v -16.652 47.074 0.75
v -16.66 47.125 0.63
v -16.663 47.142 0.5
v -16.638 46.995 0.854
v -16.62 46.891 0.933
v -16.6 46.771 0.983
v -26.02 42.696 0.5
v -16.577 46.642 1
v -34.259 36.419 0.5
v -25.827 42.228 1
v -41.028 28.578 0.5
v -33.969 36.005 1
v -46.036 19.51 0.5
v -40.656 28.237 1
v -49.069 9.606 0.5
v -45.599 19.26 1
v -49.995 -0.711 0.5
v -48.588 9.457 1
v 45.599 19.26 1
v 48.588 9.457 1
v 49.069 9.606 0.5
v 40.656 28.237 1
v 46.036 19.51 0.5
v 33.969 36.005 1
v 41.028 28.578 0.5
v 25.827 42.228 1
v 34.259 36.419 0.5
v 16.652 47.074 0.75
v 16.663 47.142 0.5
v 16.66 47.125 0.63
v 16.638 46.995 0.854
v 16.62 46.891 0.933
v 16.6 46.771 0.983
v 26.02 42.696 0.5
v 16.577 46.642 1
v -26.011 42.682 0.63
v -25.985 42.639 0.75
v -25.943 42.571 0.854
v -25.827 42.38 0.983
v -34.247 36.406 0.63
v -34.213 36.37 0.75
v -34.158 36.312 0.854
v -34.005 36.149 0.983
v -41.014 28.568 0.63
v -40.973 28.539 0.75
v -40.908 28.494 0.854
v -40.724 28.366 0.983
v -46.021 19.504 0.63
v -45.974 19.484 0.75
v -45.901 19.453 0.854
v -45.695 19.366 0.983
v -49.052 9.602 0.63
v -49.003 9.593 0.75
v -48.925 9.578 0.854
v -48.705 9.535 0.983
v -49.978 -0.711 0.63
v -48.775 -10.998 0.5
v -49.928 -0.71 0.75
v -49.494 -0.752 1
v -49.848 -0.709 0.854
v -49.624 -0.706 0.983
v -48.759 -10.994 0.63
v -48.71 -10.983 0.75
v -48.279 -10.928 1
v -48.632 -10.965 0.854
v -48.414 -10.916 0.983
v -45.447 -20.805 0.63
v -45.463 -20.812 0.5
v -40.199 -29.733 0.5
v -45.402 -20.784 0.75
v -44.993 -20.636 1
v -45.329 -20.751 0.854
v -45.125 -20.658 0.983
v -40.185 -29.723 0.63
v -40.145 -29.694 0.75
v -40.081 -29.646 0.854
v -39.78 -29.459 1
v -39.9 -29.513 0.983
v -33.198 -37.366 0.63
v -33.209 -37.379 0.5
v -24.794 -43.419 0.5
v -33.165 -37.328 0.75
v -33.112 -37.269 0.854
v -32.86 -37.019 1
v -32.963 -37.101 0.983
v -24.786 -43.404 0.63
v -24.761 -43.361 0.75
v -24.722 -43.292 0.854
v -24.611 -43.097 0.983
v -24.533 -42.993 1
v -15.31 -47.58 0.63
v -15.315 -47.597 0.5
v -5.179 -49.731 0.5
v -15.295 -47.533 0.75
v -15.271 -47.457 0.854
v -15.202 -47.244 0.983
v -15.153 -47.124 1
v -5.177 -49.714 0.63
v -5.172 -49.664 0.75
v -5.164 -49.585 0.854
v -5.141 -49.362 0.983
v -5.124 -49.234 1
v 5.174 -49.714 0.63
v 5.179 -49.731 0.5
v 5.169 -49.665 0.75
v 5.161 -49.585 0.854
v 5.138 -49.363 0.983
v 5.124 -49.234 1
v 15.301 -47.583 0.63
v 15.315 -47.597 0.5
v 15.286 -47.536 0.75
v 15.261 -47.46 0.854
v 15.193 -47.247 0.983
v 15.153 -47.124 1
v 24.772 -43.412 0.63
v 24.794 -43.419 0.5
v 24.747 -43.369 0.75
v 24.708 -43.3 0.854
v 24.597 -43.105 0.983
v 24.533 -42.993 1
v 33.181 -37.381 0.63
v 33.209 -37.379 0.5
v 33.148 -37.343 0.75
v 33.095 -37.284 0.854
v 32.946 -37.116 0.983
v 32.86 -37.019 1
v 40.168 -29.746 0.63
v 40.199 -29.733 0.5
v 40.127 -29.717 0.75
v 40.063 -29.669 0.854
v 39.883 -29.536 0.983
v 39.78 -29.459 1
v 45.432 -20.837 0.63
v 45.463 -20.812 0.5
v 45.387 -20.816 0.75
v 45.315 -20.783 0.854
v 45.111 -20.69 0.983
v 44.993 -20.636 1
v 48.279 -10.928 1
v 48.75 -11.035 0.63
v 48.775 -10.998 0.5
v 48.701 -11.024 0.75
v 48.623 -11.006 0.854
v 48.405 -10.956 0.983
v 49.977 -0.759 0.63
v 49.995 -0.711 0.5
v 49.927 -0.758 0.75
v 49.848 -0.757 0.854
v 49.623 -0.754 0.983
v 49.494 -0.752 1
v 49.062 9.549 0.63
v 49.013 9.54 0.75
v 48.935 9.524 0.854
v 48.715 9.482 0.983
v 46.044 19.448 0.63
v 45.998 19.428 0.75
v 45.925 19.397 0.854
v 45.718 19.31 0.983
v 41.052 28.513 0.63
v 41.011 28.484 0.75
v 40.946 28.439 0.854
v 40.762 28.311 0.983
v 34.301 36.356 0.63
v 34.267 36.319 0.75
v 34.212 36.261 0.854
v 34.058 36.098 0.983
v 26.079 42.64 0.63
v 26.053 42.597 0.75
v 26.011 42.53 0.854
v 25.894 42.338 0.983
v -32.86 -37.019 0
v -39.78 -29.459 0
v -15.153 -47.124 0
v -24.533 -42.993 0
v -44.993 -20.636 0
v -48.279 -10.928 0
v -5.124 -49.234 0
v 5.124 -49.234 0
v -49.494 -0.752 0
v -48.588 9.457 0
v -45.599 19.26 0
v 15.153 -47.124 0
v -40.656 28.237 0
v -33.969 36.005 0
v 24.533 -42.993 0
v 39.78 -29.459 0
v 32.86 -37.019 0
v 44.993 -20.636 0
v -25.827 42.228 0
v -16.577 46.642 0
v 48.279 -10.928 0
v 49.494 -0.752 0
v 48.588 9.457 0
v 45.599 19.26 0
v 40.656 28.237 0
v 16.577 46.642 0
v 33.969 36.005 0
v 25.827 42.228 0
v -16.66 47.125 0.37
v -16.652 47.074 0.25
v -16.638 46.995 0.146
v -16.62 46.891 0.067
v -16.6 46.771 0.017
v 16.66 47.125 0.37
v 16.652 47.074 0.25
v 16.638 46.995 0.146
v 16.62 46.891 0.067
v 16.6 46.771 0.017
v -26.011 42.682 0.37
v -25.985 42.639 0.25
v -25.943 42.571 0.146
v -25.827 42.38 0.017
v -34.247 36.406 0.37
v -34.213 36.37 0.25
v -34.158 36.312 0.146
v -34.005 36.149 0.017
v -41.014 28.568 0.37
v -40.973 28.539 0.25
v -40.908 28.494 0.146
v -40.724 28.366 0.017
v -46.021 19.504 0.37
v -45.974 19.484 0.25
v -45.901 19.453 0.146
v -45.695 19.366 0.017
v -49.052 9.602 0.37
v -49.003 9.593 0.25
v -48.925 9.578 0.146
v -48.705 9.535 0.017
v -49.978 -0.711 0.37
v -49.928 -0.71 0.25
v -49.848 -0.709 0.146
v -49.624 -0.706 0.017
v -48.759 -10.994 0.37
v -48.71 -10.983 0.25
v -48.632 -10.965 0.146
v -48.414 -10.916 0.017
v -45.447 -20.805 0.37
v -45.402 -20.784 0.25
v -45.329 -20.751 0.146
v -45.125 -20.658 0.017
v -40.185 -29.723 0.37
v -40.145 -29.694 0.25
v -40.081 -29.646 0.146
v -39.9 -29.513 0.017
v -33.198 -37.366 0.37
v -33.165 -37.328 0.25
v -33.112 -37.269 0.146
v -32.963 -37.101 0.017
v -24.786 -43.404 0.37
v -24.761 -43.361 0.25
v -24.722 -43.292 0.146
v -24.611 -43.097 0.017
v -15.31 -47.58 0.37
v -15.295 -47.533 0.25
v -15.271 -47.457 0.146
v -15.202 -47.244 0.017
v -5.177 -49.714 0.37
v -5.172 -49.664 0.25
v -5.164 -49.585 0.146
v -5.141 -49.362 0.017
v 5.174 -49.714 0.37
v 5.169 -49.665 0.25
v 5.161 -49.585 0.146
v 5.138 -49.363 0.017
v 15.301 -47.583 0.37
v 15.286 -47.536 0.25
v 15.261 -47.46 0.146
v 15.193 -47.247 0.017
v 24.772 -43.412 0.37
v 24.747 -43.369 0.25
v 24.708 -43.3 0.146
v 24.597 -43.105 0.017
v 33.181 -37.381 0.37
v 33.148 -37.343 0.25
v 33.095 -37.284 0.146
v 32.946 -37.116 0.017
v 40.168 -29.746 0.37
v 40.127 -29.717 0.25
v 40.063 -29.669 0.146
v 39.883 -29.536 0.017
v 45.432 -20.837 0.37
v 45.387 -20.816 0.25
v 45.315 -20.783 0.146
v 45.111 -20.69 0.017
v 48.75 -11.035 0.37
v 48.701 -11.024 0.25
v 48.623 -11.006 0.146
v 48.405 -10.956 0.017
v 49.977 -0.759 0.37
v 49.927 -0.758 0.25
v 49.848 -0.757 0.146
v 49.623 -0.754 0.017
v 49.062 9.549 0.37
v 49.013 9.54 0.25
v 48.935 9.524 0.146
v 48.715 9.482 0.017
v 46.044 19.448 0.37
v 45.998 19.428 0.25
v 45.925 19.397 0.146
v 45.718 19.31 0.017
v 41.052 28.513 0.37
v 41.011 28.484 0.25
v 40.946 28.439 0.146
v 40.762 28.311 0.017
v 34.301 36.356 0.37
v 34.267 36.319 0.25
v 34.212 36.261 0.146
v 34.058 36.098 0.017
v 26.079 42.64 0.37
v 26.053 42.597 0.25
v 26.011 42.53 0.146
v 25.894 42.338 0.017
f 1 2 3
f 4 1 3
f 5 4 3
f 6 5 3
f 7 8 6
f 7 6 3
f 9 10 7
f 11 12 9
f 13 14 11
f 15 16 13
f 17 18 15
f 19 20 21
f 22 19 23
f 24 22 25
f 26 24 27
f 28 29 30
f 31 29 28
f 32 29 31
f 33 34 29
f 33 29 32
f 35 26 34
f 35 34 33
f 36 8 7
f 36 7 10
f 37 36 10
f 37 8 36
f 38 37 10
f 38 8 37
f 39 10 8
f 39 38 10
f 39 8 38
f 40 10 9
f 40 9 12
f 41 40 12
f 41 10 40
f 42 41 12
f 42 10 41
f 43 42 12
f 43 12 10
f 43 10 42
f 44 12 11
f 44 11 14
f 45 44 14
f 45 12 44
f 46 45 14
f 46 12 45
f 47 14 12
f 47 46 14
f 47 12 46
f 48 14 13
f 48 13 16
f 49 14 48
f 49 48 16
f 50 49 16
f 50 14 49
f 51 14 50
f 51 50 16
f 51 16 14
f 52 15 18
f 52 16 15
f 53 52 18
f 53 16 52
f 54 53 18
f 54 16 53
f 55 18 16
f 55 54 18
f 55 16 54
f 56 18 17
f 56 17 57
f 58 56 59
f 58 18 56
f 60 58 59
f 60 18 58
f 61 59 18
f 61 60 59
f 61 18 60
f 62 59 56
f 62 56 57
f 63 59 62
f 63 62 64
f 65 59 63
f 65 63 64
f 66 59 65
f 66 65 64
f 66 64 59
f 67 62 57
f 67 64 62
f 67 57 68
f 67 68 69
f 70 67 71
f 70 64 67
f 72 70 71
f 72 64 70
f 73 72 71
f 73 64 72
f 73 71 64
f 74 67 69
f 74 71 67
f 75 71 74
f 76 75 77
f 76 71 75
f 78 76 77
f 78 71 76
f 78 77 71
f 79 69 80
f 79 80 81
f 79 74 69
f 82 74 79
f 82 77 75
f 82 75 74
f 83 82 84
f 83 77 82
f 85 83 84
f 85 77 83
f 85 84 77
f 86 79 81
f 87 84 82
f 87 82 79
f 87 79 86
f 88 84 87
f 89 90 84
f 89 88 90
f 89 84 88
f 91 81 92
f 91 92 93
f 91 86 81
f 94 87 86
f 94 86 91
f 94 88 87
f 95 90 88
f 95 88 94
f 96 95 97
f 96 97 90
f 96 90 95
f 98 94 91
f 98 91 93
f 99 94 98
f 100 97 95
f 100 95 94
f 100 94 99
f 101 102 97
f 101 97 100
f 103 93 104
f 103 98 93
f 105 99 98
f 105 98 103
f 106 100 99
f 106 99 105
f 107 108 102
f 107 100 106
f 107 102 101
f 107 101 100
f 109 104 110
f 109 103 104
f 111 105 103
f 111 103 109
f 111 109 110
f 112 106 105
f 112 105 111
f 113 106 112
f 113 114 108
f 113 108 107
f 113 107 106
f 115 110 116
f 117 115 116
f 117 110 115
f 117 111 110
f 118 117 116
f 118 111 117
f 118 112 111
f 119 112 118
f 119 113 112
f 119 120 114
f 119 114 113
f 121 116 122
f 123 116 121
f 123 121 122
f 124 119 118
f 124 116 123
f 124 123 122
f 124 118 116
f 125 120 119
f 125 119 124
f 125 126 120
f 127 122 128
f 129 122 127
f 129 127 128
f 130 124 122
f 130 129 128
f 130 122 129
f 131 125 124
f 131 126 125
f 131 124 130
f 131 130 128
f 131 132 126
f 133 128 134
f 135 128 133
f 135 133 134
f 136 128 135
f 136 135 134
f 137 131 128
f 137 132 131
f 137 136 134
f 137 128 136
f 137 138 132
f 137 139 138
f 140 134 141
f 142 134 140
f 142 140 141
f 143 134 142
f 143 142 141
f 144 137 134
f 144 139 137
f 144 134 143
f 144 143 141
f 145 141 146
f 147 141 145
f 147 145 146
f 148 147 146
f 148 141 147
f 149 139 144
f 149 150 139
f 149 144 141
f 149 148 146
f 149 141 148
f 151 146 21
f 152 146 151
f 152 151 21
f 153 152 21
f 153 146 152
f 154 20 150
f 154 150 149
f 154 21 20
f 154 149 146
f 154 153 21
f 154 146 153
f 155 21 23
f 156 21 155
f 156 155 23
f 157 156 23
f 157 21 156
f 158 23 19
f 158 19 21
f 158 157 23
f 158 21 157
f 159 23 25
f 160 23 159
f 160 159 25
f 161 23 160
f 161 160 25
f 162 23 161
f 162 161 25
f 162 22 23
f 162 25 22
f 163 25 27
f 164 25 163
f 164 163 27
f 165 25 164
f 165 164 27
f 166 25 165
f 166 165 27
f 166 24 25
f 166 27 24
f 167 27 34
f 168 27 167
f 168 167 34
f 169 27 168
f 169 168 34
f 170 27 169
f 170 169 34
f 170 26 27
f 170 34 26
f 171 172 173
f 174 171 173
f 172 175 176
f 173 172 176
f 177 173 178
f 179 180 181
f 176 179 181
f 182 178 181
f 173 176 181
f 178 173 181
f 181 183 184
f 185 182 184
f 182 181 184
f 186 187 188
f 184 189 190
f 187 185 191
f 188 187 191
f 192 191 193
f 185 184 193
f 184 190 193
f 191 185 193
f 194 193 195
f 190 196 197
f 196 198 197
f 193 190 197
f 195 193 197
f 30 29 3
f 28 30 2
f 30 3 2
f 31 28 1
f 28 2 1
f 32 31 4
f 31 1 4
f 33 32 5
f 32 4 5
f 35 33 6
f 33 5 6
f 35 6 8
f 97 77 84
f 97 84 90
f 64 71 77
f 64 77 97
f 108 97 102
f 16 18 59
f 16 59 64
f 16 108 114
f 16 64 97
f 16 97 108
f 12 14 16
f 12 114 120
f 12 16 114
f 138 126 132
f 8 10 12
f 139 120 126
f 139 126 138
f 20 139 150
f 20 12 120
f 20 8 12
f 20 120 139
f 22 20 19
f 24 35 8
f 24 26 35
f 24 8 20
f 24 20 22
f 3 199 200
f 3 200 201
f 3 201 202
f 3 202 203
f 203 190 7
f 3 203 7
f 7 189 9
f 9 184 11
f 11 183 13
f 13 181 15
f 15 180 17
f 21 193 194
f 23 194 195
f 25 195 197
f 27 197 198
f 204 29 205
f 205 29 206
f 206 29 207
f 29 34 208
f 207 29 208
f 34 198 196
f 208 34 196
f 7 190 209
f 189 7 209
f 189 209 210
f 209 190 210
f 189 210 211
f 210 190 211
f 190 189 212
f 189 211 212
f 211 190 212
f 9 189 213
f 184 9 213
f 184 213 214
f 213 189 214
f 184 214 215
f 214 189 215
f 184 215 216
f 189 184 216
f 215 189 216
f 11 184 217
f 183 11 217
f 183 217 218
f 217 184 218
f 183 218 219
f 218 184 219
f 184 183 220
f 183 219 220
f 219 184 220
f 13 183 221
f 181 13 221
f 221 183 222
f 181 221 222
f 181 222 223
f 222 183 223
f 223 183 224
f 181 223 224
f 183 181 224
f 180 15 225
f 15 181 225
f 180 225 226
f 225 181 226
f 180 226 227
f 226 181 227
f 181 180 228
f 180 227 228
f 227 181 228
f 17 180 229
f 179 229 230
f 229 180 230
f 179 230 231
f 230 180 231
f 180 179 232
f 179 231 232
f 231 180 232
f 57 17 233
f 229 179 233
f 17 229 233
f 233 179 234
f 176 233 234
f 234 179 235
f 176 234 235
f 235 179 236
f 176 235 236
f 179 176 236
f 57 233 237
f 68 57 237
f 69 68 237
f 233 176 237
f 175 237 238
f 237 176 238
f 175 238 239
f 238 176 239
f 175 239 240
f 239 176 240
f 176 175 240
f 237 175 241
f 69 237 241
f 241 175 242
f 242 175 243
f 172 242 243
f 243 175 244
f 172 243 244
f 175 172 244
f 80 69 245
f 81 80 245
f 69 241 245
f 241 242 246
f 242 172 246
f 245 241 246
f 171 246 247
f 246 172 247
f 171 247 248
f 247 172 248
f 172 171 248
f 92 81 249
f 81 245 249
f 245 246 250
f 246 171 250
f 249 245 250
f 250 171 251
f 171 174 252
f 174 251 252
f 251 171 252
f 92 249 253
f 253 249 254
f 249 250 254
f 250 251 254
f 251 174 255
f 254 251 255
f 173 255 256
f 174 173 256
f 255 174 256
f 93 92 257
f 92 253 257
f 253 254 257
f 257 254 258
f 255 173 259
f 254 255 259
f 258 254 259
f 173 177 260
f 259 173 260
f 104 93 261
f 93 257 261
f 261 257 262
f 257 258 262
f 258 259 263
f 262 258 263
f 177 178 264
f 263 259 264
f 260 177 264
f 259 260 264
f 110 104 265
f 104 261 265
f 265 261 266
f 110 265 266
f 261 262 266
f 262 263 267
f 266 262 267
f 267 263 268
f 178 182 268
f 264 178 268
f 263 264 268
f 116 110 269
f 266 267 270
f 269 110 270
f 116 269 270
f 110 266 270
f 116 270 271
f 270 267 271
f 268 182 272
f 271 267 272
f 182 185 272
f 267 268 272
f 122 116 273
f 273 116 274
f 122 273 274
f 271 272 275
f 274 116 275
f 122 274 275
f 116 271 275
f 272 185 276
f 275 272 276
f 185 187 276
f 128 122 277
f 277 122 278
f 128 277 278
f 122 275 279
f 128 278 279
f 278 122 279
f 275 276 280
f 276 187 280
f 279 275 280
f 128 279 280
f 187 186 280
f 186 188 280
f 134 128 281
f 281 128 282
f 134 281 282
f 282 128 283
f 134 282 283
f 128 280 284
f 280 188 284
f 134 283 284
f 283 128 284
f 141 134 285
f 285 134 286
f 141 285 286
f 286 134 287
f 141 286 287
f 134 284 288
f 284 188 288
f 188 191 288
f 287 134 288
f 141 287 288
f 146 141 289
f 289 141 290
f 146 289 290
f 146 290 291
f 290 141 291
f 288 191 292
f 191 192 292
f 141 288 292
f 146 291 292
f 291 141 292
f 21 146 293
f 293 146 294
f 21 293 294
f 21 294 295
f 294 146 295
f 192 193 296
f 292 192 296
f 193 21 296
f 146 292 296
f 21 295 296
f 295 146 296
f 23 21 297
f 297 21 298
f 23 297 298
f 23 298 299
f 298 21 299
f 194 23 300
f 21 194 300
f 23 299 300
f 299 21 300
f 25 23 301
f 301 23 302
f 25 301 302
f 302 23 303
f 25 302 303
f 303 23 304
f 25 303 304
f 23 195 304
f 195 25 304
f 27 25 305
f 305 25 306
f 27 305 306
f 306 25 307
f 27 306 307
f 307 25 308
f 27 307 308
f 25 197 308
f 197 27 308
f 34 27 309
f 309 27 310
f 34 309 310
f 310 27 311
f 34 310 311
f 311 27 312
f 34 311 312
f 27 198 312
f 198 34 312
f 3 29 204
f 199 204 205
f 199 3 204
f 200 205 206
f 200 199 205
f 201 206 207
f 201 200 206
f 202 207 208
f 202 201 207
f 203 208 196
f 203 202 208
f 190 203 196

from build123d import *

# Parameters (mm, degrees)
F1_DEPTH = 1
F2_R     = 0.49999


# Not quite as in the source:
# - a fillet or chamfer is up to 0.001 mm smaller than in the source, because OpenCascade refuses the exact size


with BuildPart() as f1:
    # F0 (on Top) → F1 (new body)
    with BuildSketch(Plane.XY):
        with BuildLine():
            Line((16.6633232089, 47.1416340365), (-16.6633232089, 47.1416340365))
            ThreePointArc((-16.6633232089, 47.1416340365), (0, -50), (16.6633232089, 47.1416340365))
        make_face()
    extrude(amount=F1_DEPTH)

    # F2 (radius 0.5 in the source; OpenCascade refuses exactly that, so slightly less here)
    f2_edges = [f1.edges().sort_by_distance(p)[0] for p in [
        (0, 47.141634, 1),
        (0, -50, 1),
        (0, 47.141634, 0),
        (0, -50, 0),
    ]]
    fillet(f2_edges, radius=F2_R)


solid = f1.part
